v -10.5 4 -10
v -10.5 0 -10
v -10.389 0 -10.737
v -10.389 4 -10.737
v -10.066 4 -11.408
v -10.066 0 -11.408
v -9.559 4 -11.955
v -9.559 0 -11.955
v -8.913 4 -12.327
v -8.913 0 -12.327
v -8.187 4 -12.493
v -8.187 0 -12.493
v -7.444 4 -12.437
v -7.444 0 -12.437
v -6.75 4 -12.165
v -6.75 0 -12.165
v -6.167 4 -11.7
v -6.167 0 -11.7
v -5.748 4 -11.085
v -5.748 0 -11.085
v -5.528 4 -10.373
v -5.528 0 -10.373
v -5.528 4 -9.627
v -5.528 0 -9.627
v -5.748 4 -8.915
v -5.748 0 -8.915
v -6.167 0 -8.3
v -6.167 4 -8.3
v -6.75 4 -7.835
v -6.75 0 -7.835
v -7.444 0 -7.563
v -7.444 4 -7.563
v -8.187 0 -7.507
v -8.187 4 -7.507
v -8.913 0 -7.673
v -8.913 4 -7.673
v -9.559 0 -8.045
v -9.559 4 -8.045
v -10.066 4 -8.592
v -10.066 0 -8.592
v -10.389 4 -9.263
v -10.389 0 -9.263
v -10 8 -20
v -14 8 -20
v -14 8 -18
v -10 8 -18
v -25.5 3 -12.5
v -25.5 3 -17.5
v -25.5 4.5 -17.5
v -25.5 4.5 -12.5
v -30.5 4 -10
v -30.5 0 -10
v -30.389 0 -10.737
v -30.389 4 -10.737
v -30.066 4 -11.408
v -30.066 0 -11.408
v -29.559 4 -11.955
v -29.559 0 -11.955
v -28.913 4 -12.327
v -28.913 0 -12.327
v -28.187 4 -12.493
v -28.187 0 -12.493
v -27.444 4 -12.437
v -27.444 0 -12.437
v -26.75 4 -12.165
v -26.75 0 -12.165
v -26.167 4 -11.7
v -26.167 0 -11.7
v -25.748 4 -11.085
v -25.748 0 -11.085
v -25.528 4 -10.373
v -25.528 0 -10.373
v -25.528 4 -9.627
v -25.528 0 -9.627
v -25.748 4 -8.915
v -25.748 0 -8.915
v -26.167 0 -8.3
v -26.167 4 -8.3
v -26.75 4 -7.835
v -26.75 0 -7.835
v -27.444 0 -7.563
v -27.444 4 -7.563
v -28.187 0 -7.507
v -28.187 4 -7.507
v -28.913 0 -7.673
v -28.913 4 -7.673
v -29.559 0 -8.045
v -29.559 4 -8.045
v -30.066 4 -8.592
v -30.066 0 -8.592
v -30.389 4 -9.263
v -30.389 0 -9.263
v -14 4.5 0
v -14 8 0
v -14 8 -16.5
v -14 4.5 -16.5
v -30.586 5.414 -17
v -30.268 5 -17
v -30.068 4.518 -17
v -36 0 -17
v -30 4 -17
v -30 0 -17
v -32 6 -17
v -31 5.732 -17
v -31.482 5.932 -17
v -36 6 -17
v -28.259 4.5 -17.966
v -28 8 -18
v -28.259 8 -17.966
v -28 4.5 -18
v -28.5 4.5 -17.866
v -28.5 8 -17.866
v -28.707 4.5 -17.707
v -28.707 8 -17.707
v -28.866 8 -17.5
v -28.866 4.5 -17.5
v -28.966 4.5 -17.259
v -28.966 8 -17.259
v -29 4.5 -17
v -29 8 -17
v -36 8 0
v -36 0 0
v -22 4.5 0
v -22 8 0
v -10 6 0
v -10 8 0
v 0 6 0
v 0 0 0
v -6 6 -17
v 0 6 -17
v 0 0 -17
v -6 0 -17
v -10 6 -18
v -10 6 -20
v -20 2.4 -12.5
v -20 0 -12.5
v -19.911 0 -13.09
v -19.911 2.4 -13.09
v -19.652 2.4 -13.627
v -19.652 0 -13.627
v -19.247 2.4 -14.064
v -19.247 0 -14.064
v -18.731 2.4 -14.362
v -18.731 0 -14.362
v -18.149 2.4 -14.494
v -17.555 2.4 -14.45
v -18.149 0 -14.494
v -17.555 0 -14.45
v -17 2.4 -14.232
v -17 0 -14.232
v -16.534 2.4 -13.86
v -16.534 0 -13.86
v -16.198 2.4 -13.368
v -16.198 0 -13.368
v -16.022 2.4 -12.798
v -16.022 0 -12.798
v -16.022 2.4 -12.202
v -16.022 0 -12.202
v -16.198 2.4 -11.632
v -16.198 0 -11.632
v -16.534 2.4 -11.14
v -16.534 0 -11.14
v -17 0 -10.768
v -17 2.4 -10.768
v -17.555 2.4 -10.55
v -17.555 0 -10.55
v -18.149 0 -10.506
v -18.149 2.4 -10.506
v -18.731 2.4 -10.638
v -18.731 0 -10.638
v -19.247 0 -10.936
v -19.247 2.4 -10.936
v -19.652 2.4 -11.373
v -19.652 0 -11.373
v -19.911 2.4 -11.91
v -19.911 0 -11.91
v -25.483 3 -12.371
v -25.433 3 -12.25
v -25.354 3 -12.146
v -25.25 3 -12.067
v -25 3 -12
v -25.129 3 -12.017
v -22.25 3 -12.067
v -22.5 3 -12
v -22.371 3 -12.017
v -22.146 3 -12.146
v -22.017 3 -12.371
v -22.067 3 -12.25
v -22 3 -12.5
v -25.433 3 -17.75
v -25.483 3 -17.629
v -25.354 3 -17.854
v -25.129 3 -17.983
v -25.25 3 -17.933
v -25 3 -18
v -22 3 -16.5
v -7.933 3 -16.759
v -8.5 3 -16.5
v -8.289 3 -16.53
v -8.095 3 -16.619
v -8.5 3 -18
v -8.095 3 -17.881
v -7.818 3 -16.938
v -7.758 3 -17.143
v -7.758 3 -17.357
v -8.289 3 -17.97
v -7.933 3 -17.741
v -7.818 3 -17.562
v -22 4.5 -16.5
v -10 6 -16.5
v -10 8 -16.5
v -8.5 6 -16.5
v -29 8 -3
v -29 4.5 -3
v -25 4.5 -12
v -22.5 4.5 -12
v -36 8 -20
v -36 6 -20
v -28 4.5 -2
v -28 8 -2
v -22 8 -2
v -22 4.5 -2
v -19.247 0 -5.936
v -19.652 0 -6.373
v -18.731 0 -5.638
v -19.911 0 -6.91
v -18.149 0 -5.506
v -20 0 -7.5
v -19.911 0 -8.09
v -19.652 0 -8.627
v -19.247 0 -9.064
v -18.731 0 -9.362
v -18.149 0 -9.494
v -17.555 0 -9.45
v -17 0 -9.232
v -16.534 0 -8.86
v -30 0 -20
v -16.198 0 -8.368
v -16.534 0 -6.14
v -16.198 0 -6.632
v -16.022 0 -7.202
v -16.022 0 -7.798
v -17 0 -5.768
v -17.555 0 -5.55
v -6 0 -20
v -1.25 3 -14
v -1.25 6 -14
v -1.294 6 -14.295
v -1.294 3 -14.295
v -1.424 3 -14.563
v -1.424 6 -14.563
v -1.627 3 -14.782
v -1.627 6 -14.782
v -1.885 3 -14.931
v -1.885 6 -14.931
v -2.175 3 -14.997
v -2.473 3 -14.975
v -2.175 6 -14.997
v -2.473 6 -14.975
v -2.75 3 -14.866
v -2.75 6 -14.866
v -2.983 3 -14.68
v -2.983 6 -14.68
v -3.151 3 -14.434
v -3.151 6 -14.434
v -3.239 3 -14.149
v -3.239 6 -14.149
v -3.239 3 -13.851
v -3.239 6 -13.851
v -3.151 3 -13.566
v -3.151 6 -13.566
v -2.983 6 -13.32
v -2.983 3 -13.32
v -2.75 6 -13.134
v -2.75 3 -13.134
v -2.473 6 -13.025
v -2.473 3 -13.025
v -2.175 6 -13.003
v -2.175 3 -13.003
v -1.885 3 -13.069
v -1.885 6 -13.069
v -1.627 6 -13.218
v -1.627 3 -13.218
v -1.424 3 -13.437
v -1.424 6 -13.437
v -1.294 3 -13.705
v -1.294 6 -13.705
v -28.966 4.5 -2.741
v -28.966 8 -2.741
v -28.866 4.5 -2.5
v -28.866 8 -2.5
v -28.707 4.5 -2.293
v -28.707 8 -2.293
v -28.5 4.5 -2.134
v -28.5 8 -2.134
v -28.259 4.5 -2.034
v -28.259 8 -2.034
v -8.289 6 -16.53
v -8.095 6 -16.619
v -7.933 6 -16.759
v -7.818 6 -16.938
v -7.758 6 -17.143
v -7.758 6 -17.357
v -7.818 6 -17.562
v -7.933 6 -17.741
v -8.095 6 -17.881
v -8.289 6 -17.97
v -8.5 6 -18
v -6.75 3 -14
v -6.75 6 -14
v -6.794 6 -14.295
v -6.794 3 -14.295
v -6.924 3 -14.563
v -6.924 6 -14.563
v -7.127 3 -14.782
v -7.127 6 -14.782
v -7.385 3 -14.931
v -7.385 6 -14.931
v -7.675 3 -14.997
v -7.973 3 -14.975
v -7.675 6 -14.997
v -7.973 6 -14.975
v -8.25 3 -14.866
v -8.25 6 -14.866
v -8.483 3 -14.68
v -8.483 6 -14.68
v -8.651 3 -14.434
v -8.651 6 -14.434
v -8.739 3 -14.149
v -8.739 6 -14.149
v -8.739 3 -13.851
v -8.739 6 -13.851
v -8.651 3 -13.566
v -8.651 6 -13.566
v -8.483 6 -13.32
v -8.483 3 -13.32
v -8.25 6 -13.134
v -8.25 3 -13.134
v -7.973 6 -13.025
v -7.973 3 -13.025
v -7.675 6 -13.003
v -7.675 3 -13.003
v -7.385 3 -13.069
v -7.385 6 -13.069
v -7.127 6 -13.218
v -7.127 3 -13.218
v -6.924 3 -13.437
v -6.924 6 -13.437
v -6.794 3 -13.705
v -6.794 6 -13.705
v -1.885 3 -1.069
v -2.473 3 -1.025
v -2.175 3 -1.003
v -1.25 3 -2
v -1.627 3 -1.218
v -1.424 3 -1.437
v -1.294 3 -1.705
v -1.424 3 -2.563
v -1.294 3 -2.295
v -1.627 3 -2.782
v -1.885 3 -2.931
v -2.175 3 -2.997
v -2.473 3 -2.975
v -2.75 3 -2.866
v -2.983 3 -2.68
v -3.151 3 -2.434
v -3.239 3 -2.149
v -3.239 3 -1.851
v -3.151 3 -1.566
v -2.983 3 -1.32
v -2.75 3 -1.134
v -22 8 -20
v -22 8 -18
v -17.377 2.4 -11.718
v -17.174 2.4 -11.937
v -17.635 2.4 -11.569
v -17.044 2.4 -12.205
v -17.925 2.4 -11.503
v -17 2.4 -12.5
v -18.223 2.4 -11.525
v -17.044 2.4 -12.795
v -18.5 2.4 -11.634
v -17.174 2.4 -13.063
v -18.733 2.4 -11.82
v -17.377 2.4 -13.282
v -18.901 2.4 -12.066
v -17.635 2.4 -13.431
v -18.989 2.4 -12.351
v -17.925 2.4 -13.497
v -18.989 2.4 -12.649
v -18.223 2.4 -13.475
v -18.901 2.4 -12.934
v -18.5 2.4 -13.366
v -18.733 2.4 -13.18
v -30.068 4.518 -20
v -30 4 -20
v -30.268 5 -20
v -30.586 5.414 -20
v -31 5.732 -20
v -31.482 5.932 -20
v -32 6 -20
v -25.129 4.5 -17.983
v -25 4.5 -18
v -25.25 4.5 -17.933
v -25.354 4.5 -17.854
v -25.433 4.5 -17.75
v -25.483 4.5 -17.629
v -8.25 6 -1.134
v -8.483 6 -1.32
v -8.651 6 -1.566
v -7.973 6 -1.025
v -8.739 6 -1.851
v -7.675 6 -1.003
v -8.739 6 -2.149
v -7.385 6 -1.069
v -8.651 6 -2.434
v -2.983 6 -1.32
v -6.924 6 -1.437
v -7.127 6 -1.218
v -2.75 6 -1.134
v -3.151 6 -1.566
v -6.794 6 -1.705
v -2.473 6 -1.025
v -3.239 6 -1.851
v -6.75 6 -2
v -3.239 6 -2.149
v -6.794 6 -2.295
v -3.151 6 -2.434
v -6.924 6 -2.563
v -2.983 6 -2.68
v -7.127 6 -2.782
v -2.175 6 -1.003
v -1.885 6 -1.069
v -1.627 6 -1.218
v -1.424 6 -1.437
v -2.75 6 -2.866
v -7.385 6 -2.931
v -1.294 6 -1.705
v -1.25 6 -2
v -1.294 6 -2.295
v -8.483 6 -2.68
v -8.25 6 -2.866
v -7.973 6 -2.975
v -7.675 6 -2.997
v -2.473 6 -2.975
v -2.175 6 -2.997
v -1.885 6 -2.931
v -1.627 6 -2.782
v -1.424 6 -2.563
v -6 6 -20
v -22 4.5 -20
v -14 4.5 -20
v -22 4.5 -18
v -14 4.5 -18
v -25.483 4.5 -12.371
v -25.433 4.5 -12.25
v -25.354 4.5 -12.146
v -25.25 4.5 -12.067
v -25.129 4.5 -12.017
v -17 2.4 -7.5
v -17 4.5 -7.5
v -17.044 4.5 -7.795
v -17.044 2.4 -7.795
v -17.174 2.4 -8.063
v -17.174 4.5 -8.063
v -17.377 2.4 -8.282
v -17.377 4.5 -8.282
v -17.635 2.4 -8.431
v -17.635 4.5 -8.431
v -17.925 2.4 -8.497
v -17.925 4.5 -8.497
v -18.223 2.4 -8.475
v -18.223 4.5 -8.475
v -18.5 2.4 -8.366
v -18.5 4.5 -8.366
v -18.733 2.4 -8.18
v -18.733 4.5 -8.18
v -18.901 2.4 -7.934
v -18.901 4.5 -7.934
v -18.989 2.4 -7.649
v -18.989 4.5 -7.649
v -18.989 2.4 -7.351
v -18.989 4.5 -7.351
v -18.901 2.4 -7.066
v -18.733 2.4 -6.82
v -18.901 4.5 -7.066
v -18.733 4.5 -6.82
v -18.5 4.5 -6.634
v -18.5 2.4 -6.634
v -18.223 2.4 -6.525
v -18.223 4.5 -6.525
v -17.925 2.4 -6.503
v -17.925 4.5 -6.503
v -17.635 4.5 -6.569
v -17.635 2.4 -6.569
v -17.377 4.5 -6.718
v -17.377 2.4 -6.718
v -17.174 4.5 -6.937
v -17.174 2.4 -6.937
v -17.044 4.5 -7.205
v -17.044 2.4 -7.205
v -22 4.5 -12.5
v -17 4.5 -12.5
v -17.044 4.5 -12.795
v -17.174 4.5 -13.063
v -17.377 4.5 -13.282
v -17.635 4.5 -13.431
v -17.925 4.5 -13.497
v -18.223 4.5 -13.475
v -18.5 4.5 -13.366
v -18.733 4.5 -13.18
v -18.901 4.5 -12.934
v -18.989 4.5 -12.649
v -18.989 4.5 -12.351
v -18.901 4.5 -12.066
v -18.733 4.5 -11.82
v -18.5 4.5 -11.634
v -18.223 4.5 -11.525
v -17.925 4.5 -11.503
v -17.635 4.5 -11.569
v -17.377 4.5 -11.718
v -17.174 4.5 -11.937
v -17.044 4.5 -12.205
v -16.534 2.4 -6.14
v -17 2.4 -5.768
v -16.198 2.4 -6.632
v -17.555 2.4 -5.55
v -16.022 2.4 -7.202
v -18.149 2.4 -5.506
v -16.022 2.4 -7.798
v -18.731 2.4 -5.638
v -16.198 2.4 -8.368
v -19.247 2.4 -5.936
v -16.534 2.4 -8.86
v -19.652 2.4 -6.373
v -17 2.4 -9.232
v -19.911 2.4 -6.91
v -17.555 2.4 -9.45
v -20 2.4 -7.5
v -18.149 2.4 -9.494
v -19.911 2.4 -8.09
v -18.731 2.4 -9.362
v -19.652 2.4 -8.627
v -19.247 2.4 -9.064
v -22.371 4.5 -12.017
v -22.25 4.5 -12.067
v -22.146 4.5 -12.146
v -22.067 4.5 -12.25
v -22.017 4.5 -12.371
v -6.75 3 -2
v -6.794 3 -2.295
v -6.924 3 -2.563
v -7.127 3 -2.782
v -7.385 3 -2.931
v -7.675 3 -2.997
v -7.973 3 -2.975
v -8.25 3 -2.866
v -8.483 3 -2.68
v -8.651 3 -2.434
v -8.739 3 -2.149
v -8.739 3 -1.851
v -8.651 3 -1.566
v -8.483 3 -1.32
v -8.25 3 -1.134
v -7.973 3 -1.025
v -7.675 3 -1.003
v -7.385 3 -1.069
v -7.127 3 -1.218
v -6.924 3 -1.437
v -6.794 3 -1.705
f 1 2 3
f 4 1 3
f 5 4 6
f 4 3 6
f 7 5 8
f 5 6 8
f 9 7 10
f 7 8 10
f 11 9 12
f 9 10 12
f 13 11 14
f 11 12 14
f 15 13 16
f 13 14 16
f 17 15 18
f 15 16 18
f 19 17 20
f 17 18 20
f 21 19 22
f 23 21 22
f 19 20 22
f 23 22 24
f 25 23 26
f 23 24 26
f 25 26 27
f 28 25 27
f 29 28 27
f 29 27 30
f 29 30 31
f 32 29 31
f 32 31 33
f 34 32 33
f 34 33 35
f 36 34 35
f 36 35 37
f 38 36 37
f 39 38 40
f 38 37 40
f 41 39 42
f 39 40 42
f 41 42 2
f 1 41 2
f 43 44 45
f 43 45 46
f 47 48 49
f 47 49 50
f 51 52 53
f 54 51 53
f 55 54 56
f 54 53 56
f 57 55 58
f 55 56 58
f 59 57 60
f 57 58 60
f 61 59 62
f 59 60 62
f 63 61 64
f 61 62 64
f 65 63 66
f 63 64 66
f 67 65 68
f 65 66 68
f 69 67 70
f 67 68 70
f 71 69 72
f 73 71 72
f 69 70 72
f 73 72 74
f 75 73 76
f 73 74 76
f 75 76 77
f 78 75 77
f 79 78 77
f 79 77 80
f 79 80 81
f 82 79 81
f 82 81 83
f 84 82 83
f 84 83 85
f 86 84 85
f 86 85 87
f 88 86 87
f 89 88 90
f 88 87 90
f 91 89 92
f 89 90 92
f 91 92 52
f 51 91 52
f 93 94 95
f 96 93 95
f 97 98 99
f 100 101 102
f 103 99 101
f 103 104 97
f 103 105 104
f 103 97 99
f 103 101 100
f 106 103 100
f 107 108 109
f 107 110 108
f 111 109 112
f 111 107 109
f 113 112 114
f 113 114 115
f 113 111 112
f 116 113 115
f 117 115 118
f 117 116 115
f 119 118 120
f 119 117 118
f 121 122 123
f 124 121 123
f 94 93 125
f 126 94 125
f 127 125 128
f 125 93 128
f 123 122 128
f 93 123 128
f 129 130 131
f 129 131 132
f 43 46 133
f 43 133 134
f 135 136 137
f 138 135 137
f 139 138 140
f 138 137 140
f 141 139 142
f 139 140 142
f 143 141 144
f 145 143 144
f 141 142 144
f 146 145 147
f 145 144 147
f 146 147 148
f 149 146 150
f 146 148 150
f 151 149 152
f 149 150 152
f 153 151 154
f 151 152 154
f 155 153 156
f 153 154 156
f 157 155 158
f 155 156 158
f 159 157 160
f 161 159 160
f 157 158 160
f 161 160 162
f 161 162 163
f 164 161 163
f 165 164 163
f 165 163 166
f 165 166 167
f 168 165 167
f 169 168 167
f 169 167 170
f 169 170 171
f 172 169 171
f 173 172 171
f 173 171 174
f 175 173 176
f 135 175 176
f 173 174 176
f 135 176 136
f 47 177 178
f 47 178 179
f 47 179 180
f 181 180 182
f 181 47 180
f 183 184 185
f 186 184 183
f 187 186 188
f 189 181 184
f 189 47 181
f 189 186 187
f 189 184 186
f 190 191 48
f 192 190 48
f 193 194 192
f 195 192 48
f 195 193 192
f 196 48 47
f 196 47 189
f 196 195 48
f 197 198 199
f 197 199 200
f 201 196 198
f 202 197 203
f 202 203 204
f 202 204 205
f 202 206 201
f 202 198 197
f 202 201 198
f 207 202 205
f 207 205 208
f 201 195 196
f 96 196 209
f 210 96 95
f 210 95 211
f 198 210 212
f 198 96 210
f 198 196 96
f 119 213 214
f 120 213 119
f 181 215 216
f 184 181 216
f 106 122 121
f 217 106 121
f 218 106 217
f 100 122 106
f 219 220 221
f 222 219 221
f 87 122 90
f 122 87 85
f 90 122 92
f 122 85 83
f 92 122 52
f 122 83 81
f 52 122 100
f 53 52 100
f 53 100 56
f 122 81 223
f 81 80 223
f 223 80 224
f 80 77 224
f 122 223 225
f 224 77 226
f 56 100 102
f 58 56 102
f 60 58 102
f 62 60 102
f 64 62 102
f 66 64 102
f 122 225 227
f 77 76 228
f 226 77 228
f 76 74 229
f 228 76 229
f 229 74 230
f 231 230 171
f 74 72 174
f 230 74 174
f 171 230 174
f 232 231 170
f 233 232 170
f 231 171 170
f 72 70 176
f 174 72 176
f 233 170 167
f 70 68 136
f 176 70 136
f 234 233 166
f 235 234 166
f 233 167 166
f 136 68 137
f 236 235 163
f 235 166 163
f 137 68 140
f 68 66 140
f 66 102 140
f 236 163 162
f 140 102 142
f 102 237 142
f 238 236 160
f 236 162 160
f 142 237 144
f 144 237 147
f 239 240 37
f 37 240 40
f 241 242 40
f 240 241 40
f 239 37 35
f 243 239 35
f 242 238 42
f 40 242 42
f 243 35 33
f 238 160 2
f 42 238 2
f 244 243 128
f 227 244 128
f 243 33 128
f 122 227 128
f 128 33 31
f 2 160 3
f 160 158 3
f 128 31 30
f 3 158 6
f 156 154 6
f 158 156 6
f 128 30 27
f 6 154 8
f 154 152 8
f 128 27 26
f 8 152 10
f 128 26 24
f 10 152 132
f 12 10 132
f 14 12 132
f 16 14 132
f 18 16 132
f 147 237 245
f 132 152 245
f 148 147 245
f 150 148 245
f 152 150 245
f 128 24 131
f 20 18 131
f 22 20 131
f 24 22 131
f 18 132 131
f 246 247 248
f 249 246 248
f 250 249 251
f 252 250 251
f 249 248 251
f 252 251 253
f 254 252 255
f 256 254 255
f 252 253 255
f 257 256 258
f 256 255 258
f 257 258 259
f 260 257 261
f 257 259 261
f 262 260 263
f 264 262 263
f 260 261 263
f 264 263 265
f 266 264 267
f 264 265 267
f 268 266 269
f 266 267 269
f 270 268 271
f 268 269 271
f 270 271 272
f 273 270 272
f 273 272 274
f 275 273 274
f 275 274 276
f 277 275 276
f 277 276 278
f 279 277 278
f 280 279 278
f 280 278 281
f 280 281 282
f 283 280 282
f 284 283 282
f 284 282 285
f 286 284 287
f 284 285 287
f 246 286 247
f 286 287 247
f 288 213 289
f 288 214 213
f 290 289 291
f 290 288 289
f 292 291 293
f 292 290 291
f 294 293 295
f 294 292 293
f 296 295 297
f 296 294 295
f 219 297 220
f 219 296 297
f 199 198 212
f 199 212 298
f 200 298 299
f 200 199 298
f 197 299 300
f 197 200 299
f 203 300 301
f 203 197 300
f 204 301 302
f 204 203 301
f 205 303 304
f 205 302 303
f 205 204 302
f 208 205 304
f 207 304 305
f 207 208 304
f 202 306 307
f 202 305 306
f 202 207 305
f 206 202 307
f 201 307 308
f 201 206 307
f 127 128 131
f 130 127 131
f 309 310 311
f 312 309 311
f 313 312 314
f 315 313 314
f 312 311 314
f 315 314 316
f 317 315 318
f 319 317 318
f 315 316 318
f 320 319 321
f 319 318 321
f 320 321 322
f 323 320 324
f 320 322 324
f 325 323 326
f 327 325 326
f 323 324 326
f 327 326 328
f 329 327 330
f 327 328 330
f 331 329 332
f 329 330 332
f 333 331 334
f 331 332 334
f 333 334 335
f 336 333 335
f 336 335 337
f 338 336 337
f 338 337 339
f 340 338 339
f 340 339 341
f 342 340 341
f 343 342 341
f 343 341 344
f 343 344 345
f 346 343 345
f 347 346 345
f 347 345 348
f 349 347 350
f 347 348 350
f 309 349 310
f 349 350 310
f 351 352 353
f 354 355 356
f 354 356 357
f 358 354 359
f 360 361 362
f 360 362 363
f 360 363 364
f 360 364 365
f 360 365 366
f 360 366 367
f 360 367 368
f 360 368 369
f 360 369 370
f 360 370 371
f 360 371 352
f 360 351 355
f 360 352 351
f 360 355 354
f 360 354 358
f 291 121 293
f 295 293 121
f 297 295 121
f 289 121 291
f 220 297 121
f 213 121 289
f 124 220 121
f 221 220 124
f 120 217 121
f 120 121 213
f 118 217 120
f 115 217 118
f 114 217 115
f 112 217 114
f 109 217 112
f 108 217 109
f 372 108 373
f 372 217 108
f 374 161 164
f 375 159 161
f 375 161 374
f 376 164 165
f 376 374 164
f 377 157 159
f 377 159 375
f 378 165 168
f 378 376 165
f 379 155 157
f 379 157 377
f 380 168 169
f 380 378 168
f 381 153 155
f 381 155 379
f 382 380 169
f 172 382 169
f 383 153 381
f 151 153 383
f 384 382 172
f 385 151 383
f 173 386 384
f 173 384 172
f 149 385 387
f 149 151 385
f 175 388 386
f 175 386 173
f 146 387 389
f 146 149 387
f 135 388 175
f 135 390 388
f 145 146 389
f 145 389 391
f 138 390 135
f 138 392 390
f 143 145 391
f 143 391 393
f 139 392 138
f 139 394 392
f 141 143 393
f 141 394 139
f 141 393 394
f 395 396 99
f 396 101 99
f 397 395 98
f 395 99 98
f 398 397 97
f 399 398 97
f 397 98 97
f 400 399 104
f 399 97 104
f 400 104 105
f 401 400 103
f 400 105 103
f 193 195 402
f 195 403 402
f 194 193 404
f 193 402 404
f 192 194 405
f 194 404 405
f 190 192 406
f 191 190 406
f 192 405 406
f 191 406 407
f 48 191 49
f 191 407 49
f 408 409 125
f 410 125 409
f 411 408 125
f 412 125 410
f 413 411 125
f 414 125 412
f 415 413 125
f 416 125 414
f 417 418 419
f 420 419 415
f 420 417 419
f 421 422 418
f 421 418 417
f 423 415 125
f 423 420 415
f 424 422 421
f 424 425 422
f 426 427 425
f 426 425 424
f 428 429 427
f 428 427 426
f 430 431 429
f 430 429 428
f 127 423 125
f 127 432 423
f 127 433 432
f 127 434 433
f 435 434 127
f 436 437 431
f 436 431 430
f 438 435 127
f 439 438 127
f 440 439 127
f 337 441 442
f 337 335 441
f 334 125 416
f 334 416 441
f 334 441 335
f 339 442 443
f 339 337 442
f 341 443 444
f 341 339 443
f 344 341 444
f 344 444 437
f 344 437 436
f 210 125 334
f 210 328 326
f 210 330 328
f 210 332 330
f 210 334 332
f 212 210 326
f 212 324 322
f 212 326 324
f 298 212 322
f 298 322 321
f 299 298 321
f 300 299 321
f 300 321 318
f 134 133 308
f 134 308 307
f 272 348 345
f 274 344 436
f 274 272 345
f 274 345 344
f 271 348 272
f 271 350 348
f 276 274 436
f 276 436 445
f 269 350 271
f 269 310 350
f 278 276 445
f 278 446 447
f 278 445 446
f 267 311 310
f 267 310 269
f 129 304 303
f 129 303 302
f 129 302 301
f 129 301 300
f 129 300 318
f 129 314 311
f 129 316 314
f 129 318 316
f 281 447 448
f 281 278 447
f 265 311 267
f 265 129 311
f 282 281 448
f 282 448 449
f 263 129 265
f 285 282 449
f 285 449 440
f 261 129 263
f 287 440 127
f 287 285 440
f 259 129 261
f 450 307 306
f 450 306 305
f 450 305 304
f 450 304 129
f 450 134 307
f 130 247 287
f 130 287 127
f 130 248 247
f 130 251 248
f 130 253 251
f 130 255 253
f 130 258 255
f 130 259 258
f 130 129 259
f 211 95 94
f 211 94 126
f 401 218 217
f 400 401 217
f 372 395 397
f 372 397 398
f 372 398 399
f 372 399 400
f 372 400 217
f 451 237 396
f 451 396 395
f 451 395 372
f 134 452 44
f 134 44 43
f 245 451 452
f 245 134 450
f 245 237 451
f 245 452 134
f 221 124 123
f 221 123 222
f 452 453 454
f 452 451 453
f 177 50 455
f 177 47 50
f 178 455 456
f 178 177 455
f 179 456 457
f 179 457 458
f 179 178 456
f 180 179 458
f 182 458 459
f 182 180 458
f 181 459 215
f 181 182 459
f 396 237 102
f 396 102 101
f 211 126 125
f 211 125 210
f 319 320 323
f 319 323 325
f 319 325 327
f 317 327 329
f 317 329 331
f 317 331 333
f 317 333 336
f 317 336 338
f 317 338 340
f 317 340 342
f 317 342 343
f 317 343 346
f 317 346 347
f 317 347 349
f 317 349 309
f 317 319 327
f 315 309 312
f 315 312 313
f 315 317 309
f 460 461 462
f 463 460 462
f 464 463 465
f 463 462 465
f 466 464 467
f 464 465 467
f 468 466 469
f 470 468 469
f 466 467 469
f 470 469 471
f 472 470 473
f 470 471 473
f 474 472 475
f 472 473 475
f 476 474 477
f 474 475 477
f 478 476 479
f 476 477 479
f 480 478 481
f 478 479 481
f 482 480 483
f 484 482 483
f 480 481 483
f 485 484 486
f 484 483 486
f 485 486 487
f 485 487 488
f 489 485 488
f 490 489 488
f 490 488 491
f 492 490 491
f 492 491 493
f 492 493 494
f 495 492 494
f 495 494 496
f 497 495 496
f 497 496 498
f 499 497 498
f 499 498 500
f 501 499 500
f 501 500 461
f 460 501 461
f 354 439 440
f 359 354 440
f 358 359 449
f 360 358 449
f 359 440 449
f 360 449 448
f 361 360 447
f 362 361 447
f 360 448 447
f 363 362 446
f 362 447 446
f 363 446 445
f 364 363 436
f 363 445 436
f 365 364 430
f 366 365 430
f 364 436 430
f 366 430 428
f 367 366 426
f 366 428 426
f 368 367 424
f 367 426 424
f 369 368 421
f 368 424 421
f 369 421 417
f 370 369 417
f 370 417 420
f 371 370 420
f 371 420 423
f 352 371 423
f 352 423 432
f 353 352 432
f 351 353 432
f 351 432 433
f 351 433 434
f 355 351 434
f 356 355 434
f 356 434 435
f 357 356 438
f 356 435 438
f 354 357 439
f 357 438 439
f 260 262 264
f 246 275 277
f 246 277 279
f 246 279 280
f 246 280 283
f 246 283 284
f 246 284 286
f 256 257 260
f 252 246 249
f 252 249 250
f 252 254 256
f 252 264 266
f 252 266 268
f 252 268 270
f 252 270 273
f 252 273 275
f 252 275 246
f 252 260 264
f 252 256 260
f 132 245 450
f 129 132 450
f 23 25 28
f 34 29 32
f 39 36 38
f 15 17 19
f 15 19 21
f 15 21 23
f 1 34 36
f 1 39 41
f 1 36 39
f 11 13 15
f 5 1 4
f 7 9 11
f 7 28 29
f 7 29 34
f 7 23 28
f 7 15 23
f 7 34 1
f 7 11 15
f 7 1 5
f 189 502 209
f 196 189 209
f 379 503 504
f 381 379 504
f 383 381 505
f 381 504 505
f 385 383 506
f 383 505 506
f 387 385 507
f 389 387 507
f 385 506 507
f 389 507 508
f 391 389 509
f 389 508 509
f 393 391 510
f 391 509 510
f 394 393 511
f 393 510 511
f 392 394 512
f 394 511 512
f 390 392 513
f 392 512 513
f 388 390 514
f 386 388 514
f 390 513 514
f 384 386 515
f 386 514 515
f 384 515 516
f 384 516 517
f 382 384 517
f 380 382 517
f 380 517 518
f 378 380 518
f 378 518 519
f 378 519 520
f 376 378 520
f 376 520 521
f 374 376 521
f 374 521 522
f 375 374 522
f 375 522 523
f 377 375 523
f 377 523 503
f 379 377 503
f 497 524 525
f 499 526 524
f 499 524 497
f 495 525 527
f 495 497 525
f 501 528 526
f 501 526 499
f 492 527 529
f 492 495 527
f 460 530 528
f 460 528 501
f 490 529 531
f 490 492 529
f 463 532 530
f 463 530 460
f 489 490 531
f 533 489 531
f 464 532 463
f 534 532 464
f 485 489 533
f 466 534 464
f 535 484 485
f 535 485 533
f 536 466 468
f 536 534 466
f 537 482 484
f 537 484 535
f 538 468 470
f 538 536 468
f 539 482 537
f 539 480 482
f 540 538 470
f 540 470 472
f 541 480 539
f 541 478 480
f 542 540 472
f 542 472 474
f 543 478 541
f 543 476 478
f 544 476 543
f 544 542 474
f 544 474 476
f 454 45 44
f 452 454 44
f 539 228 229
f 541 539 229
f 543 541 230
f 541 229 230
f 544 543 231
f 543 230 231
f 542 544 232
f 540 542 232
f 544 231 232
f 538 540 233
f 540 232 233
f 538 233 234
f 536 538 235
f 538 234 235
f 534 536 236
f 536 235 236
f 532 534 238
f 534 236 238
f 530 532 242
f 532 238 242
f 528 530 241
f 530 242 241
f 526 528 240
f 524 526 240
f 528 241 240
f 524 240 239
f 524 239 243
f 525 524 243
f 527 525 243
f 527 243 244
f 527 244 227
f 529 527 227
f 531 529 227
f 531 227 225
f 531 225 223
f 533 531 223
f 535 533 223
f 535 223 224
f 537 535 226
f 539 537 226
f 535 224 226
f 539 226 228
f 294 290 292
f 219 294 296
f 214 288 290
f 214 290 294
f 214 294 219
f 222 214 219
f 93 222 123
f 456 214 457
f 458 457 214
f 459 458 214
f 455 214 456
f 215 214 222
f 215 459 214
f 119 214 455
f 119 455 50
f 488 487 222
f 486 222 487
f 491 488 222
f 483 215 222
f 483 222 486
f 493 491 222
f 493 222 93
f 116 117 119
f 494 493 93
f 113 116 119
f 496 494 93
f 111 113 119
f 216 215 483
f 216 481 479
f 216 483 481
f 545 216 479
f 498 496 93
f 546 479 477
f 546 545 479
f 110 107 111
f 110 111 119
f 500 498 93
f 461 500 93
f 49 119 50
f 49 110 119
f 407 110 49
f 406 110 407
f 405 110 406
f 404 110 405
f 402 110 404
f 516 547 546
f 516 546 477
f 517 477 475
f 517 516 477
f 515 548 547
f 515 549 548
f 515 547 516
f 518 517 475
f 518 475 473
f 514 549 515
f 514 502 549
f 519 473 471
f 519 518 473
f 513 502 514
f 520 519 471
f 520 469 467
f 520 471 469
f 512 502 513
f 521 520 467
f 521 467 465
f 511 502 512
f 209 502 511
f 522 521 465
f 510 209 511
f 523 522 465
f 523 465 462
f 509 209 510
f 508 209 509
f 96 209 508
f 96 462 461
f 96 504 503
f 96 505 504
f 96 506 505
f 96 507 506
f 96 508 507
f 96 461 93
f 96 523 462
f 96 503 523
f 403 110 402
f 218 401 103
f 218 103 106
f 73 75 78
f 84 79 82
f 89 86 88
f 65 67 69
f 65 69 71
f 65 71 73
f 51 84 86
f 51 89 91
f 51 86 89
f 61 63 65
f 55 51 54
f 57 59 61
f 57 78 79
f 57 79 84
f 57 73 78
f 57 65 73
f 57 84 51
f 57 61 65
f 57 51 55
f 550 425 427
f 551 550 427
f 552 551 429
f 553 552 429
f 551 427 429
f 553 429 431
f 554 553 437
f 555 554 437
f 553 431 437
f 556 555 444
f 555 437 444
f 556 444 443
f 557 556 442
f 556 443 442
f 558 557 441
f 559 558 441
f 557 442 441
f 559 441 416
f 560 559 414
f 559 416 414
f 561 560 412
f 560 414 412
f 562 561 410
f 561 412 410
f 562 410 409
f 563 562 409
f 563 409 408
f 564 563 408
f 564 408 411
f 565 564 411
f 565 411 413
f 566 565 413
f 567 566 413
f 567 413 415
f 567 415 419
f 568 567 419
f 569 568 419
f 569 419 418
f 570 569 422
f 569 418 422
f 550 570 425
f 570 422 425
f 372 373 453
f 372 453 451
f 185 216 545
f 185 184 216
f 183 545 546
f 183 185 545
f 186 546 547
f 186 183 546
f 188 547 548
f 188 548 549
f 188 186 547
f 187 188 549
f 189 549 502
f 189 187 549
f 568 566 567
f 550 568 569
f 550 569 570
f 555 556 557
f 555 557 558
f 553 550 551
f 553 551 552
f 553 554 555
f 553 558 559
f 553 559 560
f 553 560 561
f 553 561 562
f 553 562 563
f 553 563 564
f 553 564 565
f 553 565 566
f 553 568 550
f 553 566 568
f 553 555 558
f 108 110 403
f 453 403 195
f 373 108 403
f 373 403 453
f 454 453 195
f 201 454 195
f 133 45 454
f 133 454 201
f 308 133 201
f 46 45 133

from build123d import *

# Parameters (mm, degrees)
SKETCH_1_W           = 36
SKETCH_1_H           = 20
EXTRUDE_1_DEPTH      = 8
SKETCH_2_W           = 8
SKETCH_2_H           = 20
CUT_EXTRUDE_1_DEPTH  = 3.5
SKETCH_3_R           = 2.5
CUT_EXTRUDE_2_DEPTH  = 4
SKETCH_5_W           = 7
SKETCH_5_H           = 16
CUT_EXTRUDE_4_DEPTH  = 3.5
FILLET_1_R           = 1
SKETCH_6_R           = 1
CUT_EXTRUDE_5_DEPTH  = 5.5
SKETCH_7_W           = 10
SKETCH_7_H           = 20
CUT_EXTRUDE_6_DEPTH  = 2
SKETCH_9_R           = 1
CUT_EXTRUDE_10_DEPTH = 3
SKETCH_10_R          = 2
CUT_EXTRUDE_11_DEPTH = 2.4
SKETCH_11_W          = 6
SKETCH_11_H          = 6
CUT_EXTRUDE_15_DEPTH = 3
SKETCH_14_W          = 3.5
SKETCH_14_H          = 6
CUT_EXTRUDE_17_DEPTH = 1.5
FILLET_4_R           = 0.5
CUT_EXTRUDE_18_DEPTH = 28
FILLET_5_R           = 0.5
FILLET_6_R           = 2


with BuildPart() as part:
    # 草图1 → 凸台-拉伸1 (new body)
    with BuildSketch(Plane(origin=(0, 0, 0), x_dir=(1, 0, 0), z_dir=(0, 1, 0))):
        with Locations((-18, 10)):
            Rectangle(SKETCH_1_W, SKETCH_1_H)
    extrude(amount=EXTRUDE_1_DEPTH)

    # 草图2 → 切除-拉伸1 (cut)
    with BuildSketch(Plane(origin=(0, 8, 0), x_dir=(1, 0, 0), z_dir=(0, 1, 0))):
        with Locations((-18, 10)):
            Rectangle(SKETCH_2_W, SKETCH_2_H)
    extrude(amount=-CUT_EXTRUDE_1_DEPTH, mode=Mode.SUBTRACT)

    # 草图3 → 切除-拉伸2 (cut)
    with BuildSketch(Plane(origin=(0, 0, 0), x_dir=(-1, 0, 0), z_dir=(0, -1, 0))):
        with Locations((8, 10)):
            Circle(SKETCH_3_R)
        with Locations((28, 10)):
            Circle(SKETCH_3_R)
    extrude(amount=-CUT_EXTRUDE_2_DEPTH, mode=Mode.SUBTRACT)

    # 草图5 → 切除-拉伸4 (cut)
    with BuildSketch(Plane(origin=(0, 8, 0), x_dir=(1, 0, 0), z_dir=(0, 1, 0))):
        with Locations((-25.5, 10)):
            Rectangle(SKETCH_5_W, SKETCH_5_H)
    extrude(amount=-CUT_EXTRUDE_4_DEPTH, mode=Mode.SUBTRACT)

    # 圆角1
    fillet_1_edges = [part.edges().sort_by_distance(p)[0] for p in [
        (-29, 6.25, -2),
        (-29, 6.25, -18),
    ]]
    fillet(fillet_1_edges, radius=FILLET_1_R)

    # 草图6 → 切除-拉伸5 (cut, through all)
    with BuildSketch(Plane(origin=(0, 4.5, 0), x_dir=(1, 0, 0), z_dir=(0, 1, 0))):
        with Locations((-18, 12.5)):
            Circle(SKETCH_6_R)
        with Locations((-18, 7.5)):
            Circle(SKETCH_6_R)
    extrude(amount=-CUT_EXTRUDE_5_DEPTH, mode=Mode.SUBTRACT)

    # 草图7 → 切除-拉伸6 (cut)
    with BuildSketch(Plane(origin=(0, 8, 0), x_dir=(1, 0, 0), z_dir=(0, 1, 0))):
        with Locations((-5, 10)):
            Rectangle(SKETCH_7_W, SKETCH_7_H)
    extrude(amount=-CUT_EXTRUDE_6_DEPTH, mode=Mode.SUBTRACT)

    # 草图9 → 切除-拉伸10 (cut)
    with BuildSketch(Plane(origin=(0, 6, 0), x_dir=(1, 0, 0), z_dir=(0, 1, 0))):
        with Locations((-2.25, 2)):
            Circle(SKETCH_9_R)
        with Locations((-7.75, 2)):
            Circle(SKETCH_9_R)
        with Locations((-2.25, 14)):
            Circle(SKETCH_9_R)
        with Locations((-7.75, 14)):
            Circle(SKETCH_9_R)
    extrude(amount=-CUT_EXTRUDE_10_DEPTH, mode=Mode.SUBTRACT)

    # 草图10 → 切除-拉伸11 (cut)
    with BuildSketch(Plane(origin=(0, 0, 0), x_dir=(-1, 0, 0), z_dir=(0, -1, 0))):
        with Locations((18, 12.5)):
            Circle(SKETCH_10_R)
        with Locations((18, 7.5)):
            Circle(SKETCH_10_R)
    extrude(amount=-CUT_EXTRUDE_11_DEPTH, mode=Mode.SUBTRACT)

    # 草图11 → 切除-拉伸15 (cut)
    with BuildSketch(Plane(origin=(0, 0, -20), x_dir=(-1, 0, 0), z_dir=(0, 0, -1))):
        with Locations((3, 3)):
            Rectangle(SKETCH_11_W, SKETCH_11_H)
        with Locations((33, 3)):
            Rectangle(SKETCH_11_W, SKETCH_11_H)
    extrude(amount=-CUT_EXTRUDE_15_DEPTH, mode=Mode.SUBTRACT)

    # 草图14 → 切除-拉伸17 (cut)
    with BuildSketch(Plane(origin=(0, 4.5, 0), x_dir=(1, 0, 0), z_dir=(0, 1, 0))):
        with Locations((-23.75, 15)):
            Rectangle(SKETCH_14_W, SKETCH_14_H)
    extrude(amount=-CUT_EXTRUDE_17_DEPTH, mode=Mode.SUBTRACT)

    # 圆角4
    fillet_4_edges = [part.edges().sort_by_distance(p)[0] for p in [
        (-22, 3.75, -18),
        (-22, 3.75, -12),
        (-25.5, 3.75, -12),
        (-25.5, 3.75, -18),
    ]]
    fillet(fillet_4_edges, radius=FILLET_4_R)

    # 草图15 → 切除-拉伸18 (cut)
    with BuildSketch(Plane(origin=(0, 3, 0), x_dir=(1, 0, 0), z_dir=(0, 1, 0))):
        with BuildLine():
            Line((-25.5, 16.5), (-8.5, 16.5))
            ThreePointArc((-8.5, 16.5), (-7.75, 17.25), (-8.5, 18))
            Line((-8.5, 18), (-25.5, 18))
            Line((-25.5, 18), (-25.5, 16.5))
        make_face()
    extrude(amount=CUT_EXTRUDE_18_DEPTH, mode=Mode.SUBTRACT)

    # 圆角5
    fillet_5_edges = [part.edges().sort_by_distance(p)[0] for p in [
        (-25.5, 3.75, -18),
    ]]
    fillet(fillet_5_edges, radius=FILLET_5_R)

    # 圆角6
    fillet_6_edges = [part.edges().sort_by_distance(p)[0] for p in [
        (-30, 6, -18.5),
    ]]
    fillet(fillet_6_edges, radius=FILLET_6_R)


solid = part.part
